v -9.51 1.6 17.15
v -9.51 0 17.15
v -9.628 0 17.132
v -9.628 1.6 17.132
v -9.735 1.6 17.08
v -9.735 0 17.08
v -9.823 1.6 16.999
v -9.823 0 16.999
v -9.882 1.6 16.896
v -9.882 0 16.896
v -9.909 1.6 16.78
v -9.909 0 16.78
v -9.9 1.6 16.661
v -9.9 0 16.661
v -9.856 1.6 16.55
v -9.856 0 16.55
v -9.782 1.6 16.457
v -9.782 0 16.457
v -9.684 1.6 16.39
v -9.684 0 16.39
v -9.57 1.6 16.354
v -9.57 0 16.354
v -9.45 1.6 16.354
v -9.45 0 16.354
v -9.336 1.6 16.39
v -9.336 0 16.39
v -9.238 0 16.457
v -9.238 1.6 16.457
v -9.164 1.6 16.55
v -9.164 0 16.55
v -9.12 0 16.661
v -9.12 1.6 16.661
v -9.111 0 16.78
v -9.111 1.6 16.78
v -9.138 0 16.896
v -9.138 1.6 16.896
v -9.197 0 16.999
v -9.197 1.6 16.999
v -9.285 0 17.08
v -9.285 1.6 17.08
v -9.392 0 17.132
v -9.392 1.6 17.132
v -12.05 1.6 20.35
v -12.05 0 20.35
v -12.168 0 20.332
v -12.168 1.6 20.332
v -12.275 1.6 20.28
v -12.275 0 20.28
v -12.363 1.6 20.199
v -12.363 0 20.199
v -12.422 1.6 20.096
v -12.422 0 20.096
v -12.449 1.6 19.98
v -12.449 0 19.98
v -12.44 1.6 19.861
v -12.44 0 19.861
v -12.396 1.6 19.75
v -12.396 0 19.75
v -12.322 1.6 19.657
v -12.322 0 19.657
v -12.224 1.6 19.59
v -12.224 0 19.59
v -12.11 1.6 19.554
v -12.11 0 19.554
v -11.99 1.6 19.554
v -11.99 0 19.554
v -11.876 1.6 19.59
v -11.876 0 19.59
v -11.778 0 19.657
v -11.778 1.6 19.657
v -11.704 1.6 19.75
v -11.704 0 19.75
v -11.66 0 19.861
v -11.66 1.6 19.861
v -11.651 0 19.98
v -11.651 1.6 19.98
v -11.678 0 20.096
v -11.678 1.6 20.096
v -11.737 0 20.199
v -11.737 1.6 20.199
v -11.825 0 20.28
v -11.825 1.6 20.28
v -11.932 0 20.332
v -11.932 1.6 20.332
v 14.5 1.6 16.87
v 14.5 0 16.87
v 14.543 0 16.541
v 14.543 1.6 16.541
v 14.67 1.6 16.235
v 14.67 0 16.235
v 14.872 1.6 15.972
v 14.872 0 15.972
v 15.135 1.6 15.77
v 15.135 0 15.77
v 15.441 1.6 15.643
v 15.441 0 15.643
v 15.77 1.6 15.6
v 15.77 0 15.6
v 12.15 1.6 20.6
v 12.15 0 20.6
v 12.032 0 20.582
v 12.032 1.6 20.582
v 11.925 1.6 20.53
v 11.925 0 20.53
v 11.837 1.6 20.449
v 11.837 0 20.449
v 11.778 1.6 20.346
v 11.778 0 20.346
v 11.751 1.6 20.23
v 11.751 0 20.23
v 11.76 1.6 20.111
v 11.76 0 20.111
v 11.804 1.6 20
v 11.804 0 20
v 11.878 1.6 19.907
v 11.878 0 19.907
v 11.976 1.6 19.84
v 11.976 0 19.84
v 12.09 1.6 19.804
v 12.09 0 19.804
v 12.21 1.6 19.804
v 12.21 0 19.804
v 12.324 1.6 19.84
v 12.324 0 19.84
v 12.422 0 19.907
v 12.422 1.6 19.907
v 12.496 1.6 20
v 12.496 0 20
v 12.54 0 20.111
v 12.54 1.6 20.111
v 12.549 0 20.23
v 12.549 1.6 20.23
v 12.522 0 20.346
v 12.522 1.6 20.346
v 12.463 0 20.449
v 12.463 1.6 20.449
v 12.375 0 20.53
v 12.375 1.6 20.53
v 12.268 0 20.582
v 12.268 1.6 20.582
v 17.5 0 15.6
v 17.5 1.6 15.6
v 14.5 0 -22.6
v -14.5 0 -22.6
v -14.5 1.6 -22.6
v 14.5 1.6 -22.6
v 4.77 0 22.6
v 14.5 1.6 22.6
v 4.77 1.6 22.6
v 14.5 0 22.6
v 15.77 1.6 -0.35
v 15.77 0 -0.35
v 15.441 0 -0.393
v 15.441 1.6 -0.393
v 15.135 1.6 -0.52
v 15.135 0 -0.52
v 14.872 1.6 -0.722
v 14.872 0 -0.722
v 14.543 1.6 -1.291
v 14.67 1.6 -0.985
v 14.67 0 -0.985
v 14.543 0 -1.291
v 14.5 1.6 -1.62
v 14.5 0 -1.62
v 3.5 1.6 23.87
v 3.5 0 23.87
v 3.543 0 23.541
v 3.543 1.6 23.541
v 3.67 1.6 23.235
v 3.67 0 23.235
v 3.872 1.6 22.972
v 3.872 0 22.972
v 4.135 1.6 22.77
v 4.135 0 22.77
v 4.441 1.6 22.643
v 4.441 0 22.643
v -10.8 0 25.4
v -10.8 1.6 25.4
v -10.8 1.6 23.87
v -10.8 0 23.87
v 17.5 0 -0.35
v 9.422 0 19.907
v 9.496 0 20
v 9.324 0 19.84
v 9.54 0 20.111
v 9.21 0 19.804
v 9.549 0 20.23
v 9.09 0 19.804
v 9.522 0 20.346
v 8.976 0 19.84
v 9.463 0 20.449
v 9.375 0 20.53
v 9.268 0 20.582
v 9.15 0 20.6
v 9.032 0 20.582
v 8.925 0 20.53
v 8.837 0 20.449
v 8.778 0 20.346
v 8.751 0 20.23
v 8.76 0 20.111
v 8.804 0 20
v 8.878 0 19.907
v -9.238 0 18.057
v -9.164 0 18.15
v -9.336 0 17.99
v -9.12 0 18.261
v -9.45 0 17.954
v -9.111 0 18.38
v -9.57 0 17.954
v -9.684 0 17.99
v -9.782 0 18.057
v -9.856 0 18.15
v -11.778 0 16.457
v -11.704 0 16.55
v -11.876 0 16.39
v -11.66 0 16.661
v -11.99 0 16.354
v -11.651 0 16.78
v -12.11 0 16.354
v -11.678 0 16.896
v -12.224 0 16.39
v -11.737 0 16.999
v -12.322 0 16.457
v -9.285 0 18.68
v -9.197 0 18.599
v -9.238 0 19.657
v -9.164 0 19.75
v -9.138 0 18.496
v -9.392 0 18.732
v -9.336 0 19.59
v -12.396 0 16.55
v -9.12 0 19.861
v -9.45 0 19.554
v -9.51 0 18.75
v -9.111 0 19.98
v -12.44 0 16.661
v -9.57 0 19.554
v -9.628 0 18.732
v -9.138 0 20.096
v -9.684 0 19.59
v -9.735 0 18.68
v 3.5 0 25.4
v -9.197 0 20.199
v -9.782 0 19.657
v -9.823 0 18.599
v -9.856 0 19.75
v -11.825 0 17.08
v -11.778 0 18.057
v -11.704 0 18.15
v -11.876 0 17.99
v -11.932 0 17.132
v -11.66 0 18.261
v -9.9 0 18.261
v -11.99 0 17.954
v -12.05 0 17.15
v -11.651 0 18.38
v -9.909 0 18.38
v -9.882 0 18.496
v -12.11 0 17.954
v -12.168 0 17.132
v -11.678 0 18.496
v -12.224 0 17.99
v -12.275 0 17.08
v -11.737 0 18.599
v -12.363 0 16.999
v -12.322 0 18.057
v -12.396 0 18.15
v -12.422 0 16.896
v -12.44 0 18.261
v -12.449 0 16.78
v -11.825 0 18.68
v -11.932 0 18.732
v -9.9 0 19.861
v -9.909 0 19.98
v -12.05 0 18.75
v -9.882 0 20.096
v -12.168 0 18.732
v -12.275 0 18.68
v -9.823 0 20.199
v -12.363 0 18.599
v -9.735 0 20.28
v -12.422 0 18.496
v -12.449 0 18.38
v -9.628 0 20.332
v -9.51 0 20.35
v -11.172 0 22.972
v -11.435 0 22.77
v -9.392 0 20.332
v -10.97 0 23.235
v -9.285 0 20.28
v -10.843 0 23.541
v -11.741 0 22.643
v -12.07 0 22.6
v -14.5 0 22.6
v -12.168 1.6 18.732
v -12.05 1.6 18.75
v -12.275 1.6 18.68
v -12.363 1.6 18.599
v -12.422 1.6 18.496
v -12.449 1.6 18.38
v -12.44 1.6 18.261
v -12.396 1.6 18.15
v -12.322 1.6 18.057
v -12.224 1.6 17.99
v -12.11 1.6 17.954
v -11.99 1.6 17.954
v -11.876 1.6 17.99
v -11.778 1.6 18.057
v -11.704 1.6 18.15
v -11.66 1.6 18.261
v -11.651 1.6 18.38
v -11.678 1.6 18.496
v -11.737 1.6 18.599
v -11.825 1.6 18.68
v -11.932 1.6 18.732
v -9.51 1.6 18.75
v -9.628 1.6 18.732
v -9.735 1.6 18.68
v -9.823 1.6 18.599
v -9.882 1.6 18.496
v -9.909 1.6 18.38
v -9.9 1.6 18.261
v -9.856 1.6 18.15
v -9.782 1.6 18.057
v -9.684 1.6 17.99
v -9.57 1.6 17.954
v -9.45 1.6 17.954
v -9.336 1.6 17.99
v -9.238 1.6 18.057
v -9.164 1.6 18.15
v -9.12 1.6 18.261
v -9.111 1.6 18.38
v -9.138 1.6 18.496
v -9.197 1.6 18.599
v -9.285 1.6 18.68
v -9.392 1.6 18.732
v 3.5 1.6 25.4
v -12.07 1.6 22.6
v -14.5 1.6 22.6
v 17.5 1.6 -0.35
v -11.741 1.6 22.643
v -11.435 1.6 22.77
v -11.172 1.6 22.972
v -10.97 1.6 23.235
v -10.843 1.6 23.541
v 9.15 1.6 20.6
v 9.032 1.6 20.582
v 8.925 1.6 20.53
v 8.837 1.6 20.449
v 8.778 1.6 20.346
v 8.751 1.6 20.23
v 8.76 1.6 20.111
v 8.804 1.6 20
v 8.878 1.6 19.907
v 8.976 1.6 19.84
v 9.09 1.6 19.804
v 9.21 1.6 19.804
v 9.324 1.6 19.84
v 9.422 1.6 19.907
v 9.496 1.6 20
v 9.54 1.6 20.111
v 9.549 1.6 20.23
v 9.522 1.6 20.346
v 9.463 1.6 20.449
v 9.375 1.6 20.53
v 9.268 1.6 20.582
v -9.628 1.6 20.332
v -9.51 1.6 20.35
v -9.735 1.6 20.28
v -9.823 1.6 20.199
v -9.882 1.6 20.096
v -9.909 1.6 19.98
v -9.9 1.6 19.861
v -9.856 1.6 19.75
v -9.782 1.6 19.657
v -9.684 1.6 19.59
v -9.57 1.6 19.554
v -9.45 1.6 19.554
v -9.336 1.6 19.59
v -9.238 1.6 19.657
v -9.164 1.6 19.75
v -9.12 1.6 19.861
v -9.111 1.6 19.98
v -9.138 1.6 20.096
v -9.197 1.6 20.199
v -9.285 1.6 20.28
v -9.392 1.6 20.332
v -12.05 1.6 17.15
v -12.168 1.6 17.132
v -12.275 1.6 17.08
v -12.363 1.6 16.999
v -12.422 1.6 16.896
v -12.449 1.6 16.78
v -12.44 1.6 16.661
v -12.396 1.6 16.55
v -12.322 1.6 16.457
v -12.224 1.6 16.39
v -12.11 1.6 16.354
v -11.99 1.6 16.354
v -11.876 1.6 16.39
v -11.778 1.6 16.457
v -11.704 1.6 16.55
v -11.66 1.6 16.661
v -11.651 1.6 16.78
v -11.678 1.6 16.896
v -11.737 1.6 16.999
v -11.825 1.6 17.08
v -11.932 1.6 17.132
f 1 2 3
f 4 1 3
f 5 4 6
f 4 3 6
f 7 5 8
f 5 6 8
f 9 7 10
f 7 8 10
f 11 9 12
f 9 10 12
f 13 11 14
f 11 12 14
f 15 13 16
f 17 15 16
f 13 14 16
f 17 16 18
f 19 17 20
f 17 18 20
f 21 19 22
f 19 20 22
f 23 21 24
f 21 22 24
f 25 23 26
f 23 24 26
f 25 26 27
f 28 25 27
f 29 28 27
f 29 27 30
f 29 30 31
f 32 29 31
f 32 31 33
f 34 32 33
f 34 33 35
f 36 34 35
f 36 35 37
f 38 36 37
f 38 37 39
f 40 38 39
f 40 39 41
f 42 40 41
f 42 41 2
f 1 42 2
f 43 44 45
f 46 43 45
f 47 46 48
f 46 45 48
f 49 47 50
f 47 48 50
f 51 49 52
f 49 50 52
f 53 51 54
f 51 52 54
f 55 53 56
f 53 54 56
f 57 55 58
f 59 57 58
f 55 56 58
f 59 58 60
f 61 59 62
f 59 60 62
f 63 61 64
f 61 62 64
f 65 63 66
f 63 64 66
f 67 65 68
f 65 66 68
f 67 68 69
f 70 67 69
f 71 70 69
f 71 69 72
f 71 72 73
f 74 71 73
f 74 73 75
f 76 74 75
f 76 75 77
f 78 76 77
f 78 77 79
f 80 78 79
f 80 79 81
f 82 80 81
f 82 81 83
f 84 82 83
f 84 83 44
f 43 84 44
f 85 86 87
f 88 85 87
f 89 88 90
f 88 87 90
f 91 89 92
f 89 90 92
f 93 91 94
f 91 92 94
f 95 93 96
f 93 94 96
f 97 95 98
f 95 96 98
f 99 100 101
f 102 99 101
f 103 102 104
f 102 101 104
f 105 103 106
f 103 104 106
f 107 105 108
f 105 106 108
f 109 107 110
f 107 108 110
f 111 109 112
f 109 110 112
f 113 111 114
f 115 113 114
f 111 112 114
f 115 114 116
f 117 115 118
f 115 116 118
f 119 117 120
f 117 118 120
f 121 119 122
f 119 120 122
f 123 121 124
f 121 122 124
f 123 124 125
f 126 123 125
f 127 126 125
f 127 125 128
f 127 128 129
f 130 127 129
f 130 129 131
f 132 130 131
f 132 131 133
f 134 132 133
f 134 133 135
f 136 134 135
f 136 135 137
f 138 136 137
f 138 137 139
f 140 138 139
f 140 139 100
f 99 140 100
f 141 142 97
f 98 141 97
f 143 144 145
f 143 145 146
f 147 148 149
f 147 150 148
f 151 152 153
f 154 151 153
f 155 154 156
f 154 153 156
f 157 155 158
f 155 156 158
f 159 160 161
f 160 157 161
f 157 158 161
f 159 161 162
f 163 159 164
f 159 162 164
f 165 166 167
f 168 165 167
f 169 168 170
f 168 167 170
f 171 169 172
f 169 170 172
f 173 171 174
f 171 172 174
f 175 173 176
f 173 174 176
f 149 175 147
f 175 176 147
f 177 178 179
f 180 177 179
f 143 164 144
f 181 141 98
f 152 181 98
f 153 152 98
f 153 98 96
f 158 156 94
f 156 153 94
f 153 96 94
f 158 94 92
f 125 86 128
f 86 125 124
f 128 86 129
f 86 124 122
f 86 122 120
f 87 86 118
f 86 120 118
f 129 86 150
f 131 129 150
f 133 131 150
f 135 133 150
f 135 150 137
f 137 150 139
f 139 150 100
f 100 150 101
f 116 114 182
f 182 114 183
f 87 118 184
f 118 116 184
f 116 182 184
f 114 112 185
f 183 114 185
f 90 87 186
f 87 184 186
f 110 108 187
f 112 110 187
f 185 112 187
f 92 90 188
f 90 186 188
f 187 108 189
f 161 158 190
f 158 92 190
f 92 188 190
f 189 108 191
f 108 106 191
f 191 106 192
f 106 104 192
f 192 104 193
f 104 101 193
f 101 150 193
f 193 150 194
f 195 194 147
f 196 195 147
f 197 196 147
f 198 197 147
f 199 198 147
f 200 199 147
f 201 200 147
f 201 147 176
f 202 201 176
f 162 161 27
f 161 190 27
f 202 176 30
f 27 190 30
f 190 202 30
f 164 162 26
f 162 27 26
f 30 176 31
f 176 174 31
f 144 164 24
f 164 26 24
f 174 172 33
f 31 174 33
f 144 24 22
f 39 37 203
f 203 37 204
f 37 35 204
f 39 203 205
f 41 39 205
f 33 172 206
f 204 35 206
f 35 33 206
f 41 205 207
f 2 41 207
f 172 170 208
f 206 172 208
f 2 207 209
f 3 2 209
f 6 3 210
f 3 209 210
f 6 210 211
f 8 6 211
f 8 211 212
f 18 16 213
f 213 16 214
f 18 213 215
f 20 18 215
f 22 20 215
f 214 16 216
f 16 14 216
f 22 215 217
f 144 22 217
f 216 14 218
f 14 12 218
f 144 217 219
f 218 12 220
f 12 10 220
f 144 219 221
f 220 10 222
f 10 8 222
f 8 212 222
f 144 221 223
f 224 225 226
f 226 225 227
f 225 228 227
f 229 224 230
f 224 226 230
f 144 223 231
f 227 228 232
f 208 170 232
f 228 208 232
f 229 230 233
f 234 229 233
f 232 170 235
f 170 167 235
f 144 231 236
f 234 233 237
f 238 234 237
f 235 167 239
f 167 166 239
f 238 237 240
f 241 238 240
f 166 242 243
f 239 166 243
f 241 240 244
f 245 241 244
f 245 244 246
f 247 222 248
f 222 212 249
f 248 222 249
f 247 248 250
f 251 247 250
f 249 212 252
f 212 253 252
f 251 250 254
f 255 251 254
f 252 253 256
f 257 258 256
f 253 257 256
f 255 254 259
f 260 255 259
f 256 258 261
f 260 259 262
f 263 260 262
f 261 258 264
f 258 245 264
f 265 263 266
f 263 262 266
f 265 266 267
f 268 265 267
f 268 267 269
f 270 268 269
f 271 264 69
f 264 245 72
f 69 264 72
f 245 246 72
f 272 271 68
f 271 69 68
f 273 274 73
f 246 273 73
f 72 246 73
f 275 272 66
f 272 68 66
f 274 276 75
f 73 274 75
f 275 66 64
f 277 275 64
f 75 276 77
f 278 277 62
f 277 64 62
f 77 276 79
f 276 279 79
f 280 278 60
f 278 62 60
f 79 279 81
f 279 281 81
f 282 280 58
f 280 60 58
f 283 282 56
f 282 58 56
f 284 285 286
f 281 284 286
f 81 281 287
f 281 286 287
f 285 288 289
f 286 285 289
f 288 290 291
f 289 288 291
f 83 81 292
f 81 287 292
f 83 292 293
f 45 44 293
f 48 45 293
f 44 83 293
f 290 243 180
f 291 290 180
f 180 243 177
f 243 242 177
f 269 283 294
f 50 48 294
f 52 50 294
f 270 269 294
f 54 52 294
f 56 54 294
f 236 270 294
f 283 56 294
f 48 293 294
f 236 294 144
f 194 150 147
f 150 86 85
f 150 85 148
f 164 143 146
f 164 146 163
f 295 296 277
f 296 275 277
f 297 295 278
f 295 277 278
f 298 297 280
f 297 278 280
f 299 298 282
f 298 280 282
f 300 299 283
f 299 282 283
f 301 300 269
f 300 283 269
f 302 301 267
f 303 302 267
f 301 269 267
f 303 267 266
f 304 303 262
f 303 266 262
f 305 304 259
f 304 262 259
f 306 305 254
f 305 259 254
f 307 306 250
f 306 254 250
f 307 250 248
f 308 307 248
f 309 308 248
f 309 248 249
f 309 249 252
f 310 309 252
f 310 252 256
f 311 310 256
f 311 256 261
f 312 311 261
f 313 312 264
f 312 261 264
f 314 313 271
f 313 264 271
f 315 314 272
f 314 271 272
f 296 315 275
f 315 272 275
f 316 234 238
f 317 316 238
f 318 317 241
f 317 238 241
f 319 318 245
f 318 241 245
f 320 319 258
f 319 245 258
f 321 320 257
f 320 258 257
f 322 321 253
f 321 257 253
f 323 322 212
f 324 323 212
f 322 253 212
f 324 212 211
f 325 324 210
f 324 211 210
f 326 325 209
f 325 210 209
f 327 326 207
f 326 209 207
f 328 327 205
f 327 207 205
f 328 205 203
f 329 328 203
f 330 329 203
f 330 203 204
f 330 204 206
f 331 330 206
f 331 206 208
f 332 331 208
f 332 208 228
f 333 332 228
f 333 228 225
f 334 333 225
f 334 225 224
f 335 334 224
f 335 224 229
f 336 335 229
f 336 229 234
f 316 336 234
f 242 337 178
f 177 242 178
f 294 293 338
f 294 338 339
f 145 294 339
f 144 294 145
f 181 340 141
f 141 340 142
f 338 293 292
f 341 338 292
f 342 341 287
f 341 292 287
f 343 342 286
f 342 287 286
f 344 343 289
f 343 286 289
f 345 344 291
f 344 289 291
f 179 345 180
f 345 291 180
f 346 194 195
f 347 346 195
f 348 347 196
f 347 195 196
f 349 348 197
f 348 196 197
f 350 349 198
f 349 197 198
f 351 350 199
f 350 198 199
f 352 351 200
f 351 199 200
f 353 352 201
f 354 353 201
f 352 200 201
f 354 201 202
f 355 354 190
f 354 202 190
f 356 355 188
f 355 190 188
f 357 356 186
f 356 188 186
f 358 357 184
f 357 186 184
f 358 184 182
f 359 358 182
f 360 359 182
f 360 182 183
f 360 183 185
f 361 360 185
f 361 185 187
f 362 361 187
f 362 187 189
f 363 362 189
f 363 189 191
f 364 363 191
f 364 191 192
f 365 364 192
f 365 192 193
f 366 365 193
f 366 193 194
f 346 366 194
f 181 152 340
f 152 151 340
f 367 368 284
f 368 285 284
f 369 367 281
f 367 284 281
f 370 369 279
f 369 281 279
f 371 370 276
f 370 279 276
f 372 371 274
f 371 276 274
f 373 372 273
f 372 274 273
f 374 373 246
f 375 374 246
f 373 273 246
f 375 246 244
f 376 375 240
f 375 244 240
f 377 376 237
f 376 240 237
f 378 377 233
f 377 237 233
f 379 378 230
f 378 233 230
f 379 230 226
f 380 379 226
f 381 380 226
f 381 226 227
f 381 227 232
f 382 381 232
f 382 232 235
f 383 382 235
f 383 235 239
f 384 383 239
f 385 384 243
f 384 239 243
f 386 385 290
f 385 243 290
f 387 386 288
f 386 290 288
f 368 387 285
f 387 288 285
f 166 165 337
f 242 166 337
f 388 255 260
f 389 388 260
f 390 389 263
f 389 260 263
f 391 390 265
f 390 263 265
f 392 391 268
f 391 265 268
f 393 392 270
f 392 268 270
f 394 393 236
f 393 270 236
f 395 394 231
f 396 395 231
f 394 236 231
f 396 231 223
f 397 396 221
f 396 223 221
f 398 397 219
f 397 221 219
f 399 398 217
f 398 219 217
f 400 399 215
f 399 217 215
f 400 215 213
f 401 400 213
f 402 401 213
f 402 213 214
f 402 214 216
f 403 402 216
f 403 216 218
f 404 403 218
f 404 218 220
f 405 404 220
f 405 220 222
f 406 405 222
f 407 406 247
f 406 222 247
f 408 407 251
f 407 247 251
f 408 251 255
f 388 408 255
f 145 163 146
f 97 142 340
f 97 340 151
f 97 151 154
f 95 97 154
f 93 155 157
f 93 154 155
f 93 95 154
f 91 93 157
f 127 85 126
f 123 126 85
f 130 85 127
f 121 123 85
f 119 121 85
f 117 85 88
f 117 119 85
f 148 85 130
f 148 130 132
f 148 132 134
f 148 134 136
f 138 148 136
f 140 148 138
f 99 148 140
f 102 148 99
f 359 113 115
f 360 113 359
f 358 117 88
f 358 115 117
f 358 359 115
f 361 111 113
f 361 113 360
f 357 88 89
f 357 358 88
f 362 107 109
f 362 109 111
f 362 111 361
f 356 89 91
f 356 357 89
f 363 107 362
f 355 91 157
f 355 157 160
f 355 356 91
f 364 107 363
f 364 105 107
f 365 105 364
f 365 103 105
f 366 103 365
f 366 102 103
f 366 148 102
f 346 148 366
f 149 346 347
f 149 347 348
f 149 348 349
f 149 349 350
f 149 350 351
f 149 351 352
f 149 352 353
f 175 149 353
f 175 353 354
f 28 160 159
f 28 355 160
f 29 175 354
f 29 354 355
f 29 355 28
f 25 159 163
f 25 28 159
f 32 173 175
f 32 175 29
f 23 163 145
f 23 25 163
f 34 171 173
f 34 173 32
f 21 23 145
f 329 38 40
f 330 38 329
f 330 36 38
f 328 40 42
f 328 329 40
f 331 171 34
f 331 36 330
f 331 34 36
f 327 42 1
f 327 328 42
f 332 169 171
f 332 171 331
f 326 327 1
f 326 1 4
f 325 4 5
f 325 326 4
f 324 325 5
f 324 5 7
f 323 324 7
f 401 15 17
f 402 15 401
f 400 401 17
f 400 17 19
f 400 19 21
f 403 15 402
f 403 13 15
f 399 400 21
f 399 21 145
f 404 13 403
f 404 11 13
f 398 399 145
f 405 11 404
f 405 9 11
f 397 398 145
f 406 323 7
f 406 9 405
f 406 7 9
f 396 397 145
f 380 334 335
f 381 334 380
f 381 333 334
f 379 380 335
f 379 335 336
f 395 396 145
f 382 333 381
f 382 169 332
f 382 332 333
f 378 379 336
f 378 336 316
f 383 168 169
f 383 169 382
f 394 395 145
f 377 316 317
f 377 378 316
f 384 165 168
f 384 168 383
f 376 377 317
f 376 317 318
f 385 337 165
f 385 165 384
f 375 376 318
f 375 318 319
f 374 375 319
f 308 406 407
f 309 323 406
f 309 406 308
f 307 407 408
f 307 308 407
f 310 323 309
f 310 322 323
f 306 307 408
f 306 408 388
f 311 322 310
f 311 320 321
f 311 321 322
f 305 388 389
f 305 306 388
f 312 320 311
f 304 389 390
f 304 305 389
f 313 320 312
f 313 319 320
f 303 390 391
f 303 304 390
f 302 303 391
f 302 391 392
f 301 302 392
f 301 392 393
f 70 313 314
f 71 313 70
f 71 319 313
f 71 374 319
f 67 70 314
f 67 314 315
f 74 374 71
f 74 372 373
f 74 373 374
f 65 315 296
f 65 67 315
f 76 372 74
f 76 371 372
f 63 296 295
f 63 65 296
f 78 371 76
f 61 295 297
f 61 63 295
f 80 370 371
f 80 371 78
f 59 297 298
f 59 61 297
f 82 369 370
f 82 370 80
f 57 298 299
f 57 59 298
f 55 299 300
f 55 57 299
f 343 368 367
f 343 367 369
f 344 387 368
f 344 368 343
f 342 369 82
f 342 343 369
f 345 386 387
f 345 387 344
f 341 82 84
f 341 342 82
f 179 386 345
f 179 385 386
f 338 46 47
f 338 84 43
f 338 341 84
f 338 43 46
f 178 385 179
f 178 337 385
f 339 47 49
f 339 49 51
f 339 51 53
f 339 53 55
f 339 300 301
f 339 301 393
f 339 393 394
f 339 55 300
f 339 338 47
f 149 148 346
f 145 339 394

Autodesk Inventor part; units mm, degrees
ref_plane "YZ Plane" through (0, 0, 0) normal (1, 0, 0) x (0, 1, 0)
ref_plane "XZ Plane" through (0, 0, 0) normal (0, 1, 0) x (-1, 0, 0)
ref_plane "XY Plane" through (0, 0, 0) normal (0, 0, 1) x (1, 0, 0)
sketch "Sketch1" plane through (0, 0, 0) normal (0, 1, 0) x (-1, 0, 0)
  line L0 (14.5, -22.6) -> (-14.5, -22.6)
  line L1 (-14.5, -22.6) -> (-14.5, 22.6)
  line L2 (-14.5, 22.6) -> (14.5, 22.6)
  line L3 (14.5, 22.6) -> (14.5, -22.6)
  point P0 (0, 0)
  point P1 (0, -22.6)
  point P2 (14.5, 0)
  dimension "d0" = 29
  dimension "d1" = 45.2
extrude "Extrusion1" add sketch "Sketch1" along normal blind 1.6
sketch "Sketch2" plane through (0, 1.6, 0) normal (0, 1, 0) x (1, 0, 0)
  line L0 (14.5, 22.6) -> (-14.5, 22.6) projected
  line L1 (-14.5, 22.6) -> (-14.5, -22.6) projected
  line L2 (-14.5, -22.6) -> (14.5, -22.6) projected
  line L3 (14.5, -22.6) -> (14.5, 22.6) projected
  line L4 (14.5, 0.35) -> (17.5, 0.35)
  line L5 (17.5, 0.35) -> (17.5, -15.6)
  line L6 (17.5, -15.6) -> (14.5, -15.6)
  line L7 (14.5, -15.6) -> (14.5, 0.35)
  point P0 (0, 0)
  point P1 (14.5, -7.625)
  point P2 (14.5, 0)
  dimension "d4" = 3
  dimension "d5" = 15.95
  dimension "d6" = 7
extrude "Extrusion2" add sketch "Sketch2" against normal up to surface (1.6 mm away) contours L4 L5 L6 L3
sketch "Sketch3" plane through (0, 1.6, 0) normal (0, 1, 0) x (1, 0, 0)
  line L0 (14.5, 22.6) -> (-14.5, 22.6) projected
  line L1 (-14.5, 22.6) -> (-14.5, -22.6) projected
  line L2 (-14.5, -22.6) -> (14.5, -22.6) projected
  line L3 (14.5, -22.6) -> (14.5, -15.6) projected
  line L4 (17.5, -15.6) -> (14.5, -15.6) projected
  line L5 (17.5, 0.35) -> (17.5, -15.6) projected
  line L6 (14.5, 0.35) -> (17.5, 0.35) projected
  line L7 (14.5, 0.35) -> (14.5, 22.6) projected
  line L8 (-10.8, -22.6) -> (3.5, -22.6)
  line L9 (3.5, -22.6) -> (3.5, -25.4)
  line L10 (3.5, -25.4) -> (-10.8, -25.4)
  line L11 (-10.8, -25.4) -> (-10.8, -22.6)
  line L12 (-14.5, -22.6) -> (14.5, -22.6) projected
  point P0 (0, 0)
  point P1 (-3.65, -22.6)
  point P2 (0, -22.6)
  dimension "d9" = 2.8
  dimension "d10" = 14.3
  dimension "d11" = 3.7
extrude "Extrusion3" add sketch "Sketch3" against normal up to surface (1.6 mm away) contours L2 L9 L10 L11
fillet "Fillet1" radius 1.27 4 edges at (-10.8, 0.8, 22.6) (3.5, 0.8, 22.6) (14.5, 0.8, 15.6) (14.5, 0.8, -0.35)
sketch "Sketch4" plane through (0, 1.6, 0) normal (0, 1, 0) x (1, 0, 0)
  line L0 (14.5, 22.6) -> (-14.5, 22.6) projected
  line L1 (-14.5, 22.6) -> (-14.5, -22.6) projected
  line L2 (-14.5, -22.6) -> (-12.07, -22.6) projected
  arc A0 (-10.8, -23.87) -> (-12.07, -22.6) centre (-12.07, -23.87) ccw projected
  line L3 (-10.8, -25.4) -> (-10.8, -23.87) projected
  line L4 (3.5, -25.4) -> (-10.8, -25.4) projected
  line L5 (3.5, -23.87) -> (3.5, -25.4) projected
  arc A1 (4.77, -22.6) -> (3.5, -23.87) centre (4.77, -23.87) ccw projected
  line L6 (4.77, -22.6) -> (14.5, -22.6) projected
  line L7 (14.5, -22.6) -> (14.5, -16.87) projected
  arc A2 (15.77, -15.6) -> (14.5, -16.87) centre (15.77, -16.87) ccw projected
  line L8 (17.5, -15.6) -> (15.77, -15.6) projected
  line L9 (17.5, 0.35) -> (17.5, -15.6) projected
  line L10 (15.77, 0.35) -> (17.5, 0.35) projected
  arc A3 (14.5, 1.62) -> (15.77, 0.35) centre (15.77, 1.62) ccw projected
  line L11 (14.5, 1.62) -> (14.5, 22.6) projected
  point P0 (0, 0)
  point P1 (12.15, -20.2)
  point P2 (9.15, -20.2)
  dimension "d15" = 2.35
  dimension "d16" = 2.4
  dimension "d17" = 2.4
  dimension "d18" = 5.35
hole "Hole1" at (12.15, 1.6, 20.2) at (9.15, 1.6, 20.2) direction (0, -1, 0) diameter 0.8 end through all
sketch "Sketch5" plane through (0, 1.6, 0) normal (0, 1, 0) x (1, 0, 0)
  circle A0 centre (12.15, -20.2) radius 0.4 projected
  circle A1 centre (9.15, -20.2) radius 0.4 projected
  line L0 (14.5, 22.6) -> (-14.5, 22.6) projected
  line L1 (-14.5, 22.6) -> (-14.5, -22.6) projected
  line L2 (-14.5, -22.6) -> (-12.07, -22.6) projected
  arc A2 (-10.8, -23.87) -> (-12.07, -22.6) centre (-12.07, -23.87) ccw projected
  line L3 (-10.8, -25.4) -> (-10.8, -23.87) projected
  line L4 (3.5, -25.4) -> (-10.8, -25.4) projected
  line L5 (3.5, -23.87) -> (3.5, -25.4) projected
  arc A3 (4.77, -22.6) -> (3.5, -23.87) centre (4.77, -23.87) ccw projected
  line L6 (4.77, -22.6) -> (14.5, -22.6) projected
  line L7 (14.5, -22.6) -> (14.5, -16.87) projected
  arc A4 (15.77, -15.6) -> (14.5, -16.87) centre (15.77, -16.87) ccw projected
  line L8 (17.5, -15.6) -> (15.77, -15.6) projected
  line L9 (17.5, 0.35) -> (17.5, -15.6) projected
  line L10 (15.77, 0.35) -> (17.5, 0.35) projected
  arc A5 (14.5, 1.62) -> (15.77, 0.35) centre (15.77, 1.62) ccw projected
  line L11 (14.5, 1.62) -> (14.5, 22.6) projected
  line L12 (-12.05, -19.95) -> (-12.05, -17) construction
  line L13 (-12.05, -19.95) -> (-11.6759, -19.95) construction
  point P0 (0, 0)
  point P1 (-12.05, -18.35)
  point P2 (-12.05, -16.75)
  point P3 (-9.51, -19.95)
  point P4 (-9.51, -18.35)
  point P5 (-9.51, -16.75)
  dimension "d26" = 2.65
  dimension "d27" = 2.45
  dimension "d30" = 1.6
  dimension "d33" = 2.54
hole "Hole2" at (-12.05, 1.6, 19.95) at (-12.05, 1.6, 18.35) at (-12.05, 1.6, 16.75) at (-9.51, 1.6, 19.95) at (-9.51, 1.6, 18.35) at (-9.51, 1.6, 16.75) direction (0, -1, 0) diameter 0.8 end through all
sketch "Sketch6" plane through (0, 1.6, 0) normal (0, 1, 0) x (1, 0, 0)
  circle A0 centre (-9.51, -18.35) radius 0.4 projected
  circle A1 centre (-12.05, -16.75) radius 0.4 projected
  circle A2 centre (-12.05, -19.95) radius 0.4 projected
  circle A3 centre (-12.05, -18.35) radius 0.4 projected
  circle A4 centre (-9.51, -19.95) radius 0.4 projected
  circle A5 centre (-9.51, -16.75) radius 0.4 projected
  circle A6 centre (12.15, -20.2) radius 0.4 projected
  circle A7 centre (9.15, -20.2) radius 0.4 projected
  line L0 (14.5, 22.6) -> (-14.5, 22.6) projected
  line L1 (-14.5, 22.6) -> (-14.5, -22.6) projected
  line L2 (-14.5, -22.6) -> (-12.07, -22.6) projected
  arc A8 (-10.8, -23.87) -> (-12.07, -22.6) centre (-12.07, -23.87) ccw projected
  line L3 (-10.8, -25.4) -> (-10.8, -23.87) projected
  line L4 (3.5, -25.4) -> (-10.8, -25.4) projected
  line L5 (3.5, -23.87) -> (3.5, -25.4) projected
  arc A9 (4.77, -22.6) -> (3.5, -23.87) centre (4.77, -23.87) ccw projected
  line L6 (4.77, -22.6) -> (14.5, -22.6) projected
  line L7 (14.5, -22.6) -> (14.5, -16.87) projected
  arc A10 (15.77, -15.6) -> (14.5, -16.87) centre (15.77, -16.87) ccw projected
  line L8 (17.5, -15.6) -> (15.77, -15.6) projected
  line L9 (17.5, 0.35) -> (17.5, -15.6) projected
  line L10 (15.77, 0.35) -> (17.5, 0.35) projected
  arc A11 (14.5, 1.62) -> (15.77, 0.35) centre (15.77, 1.62) ccw projected
  line L11 (14.5, 1.62) -> (14.5, 22.6) projected
  point P0 (0, 0)
equation "\"d17\" = d16"
properties part number "BarePCB"
